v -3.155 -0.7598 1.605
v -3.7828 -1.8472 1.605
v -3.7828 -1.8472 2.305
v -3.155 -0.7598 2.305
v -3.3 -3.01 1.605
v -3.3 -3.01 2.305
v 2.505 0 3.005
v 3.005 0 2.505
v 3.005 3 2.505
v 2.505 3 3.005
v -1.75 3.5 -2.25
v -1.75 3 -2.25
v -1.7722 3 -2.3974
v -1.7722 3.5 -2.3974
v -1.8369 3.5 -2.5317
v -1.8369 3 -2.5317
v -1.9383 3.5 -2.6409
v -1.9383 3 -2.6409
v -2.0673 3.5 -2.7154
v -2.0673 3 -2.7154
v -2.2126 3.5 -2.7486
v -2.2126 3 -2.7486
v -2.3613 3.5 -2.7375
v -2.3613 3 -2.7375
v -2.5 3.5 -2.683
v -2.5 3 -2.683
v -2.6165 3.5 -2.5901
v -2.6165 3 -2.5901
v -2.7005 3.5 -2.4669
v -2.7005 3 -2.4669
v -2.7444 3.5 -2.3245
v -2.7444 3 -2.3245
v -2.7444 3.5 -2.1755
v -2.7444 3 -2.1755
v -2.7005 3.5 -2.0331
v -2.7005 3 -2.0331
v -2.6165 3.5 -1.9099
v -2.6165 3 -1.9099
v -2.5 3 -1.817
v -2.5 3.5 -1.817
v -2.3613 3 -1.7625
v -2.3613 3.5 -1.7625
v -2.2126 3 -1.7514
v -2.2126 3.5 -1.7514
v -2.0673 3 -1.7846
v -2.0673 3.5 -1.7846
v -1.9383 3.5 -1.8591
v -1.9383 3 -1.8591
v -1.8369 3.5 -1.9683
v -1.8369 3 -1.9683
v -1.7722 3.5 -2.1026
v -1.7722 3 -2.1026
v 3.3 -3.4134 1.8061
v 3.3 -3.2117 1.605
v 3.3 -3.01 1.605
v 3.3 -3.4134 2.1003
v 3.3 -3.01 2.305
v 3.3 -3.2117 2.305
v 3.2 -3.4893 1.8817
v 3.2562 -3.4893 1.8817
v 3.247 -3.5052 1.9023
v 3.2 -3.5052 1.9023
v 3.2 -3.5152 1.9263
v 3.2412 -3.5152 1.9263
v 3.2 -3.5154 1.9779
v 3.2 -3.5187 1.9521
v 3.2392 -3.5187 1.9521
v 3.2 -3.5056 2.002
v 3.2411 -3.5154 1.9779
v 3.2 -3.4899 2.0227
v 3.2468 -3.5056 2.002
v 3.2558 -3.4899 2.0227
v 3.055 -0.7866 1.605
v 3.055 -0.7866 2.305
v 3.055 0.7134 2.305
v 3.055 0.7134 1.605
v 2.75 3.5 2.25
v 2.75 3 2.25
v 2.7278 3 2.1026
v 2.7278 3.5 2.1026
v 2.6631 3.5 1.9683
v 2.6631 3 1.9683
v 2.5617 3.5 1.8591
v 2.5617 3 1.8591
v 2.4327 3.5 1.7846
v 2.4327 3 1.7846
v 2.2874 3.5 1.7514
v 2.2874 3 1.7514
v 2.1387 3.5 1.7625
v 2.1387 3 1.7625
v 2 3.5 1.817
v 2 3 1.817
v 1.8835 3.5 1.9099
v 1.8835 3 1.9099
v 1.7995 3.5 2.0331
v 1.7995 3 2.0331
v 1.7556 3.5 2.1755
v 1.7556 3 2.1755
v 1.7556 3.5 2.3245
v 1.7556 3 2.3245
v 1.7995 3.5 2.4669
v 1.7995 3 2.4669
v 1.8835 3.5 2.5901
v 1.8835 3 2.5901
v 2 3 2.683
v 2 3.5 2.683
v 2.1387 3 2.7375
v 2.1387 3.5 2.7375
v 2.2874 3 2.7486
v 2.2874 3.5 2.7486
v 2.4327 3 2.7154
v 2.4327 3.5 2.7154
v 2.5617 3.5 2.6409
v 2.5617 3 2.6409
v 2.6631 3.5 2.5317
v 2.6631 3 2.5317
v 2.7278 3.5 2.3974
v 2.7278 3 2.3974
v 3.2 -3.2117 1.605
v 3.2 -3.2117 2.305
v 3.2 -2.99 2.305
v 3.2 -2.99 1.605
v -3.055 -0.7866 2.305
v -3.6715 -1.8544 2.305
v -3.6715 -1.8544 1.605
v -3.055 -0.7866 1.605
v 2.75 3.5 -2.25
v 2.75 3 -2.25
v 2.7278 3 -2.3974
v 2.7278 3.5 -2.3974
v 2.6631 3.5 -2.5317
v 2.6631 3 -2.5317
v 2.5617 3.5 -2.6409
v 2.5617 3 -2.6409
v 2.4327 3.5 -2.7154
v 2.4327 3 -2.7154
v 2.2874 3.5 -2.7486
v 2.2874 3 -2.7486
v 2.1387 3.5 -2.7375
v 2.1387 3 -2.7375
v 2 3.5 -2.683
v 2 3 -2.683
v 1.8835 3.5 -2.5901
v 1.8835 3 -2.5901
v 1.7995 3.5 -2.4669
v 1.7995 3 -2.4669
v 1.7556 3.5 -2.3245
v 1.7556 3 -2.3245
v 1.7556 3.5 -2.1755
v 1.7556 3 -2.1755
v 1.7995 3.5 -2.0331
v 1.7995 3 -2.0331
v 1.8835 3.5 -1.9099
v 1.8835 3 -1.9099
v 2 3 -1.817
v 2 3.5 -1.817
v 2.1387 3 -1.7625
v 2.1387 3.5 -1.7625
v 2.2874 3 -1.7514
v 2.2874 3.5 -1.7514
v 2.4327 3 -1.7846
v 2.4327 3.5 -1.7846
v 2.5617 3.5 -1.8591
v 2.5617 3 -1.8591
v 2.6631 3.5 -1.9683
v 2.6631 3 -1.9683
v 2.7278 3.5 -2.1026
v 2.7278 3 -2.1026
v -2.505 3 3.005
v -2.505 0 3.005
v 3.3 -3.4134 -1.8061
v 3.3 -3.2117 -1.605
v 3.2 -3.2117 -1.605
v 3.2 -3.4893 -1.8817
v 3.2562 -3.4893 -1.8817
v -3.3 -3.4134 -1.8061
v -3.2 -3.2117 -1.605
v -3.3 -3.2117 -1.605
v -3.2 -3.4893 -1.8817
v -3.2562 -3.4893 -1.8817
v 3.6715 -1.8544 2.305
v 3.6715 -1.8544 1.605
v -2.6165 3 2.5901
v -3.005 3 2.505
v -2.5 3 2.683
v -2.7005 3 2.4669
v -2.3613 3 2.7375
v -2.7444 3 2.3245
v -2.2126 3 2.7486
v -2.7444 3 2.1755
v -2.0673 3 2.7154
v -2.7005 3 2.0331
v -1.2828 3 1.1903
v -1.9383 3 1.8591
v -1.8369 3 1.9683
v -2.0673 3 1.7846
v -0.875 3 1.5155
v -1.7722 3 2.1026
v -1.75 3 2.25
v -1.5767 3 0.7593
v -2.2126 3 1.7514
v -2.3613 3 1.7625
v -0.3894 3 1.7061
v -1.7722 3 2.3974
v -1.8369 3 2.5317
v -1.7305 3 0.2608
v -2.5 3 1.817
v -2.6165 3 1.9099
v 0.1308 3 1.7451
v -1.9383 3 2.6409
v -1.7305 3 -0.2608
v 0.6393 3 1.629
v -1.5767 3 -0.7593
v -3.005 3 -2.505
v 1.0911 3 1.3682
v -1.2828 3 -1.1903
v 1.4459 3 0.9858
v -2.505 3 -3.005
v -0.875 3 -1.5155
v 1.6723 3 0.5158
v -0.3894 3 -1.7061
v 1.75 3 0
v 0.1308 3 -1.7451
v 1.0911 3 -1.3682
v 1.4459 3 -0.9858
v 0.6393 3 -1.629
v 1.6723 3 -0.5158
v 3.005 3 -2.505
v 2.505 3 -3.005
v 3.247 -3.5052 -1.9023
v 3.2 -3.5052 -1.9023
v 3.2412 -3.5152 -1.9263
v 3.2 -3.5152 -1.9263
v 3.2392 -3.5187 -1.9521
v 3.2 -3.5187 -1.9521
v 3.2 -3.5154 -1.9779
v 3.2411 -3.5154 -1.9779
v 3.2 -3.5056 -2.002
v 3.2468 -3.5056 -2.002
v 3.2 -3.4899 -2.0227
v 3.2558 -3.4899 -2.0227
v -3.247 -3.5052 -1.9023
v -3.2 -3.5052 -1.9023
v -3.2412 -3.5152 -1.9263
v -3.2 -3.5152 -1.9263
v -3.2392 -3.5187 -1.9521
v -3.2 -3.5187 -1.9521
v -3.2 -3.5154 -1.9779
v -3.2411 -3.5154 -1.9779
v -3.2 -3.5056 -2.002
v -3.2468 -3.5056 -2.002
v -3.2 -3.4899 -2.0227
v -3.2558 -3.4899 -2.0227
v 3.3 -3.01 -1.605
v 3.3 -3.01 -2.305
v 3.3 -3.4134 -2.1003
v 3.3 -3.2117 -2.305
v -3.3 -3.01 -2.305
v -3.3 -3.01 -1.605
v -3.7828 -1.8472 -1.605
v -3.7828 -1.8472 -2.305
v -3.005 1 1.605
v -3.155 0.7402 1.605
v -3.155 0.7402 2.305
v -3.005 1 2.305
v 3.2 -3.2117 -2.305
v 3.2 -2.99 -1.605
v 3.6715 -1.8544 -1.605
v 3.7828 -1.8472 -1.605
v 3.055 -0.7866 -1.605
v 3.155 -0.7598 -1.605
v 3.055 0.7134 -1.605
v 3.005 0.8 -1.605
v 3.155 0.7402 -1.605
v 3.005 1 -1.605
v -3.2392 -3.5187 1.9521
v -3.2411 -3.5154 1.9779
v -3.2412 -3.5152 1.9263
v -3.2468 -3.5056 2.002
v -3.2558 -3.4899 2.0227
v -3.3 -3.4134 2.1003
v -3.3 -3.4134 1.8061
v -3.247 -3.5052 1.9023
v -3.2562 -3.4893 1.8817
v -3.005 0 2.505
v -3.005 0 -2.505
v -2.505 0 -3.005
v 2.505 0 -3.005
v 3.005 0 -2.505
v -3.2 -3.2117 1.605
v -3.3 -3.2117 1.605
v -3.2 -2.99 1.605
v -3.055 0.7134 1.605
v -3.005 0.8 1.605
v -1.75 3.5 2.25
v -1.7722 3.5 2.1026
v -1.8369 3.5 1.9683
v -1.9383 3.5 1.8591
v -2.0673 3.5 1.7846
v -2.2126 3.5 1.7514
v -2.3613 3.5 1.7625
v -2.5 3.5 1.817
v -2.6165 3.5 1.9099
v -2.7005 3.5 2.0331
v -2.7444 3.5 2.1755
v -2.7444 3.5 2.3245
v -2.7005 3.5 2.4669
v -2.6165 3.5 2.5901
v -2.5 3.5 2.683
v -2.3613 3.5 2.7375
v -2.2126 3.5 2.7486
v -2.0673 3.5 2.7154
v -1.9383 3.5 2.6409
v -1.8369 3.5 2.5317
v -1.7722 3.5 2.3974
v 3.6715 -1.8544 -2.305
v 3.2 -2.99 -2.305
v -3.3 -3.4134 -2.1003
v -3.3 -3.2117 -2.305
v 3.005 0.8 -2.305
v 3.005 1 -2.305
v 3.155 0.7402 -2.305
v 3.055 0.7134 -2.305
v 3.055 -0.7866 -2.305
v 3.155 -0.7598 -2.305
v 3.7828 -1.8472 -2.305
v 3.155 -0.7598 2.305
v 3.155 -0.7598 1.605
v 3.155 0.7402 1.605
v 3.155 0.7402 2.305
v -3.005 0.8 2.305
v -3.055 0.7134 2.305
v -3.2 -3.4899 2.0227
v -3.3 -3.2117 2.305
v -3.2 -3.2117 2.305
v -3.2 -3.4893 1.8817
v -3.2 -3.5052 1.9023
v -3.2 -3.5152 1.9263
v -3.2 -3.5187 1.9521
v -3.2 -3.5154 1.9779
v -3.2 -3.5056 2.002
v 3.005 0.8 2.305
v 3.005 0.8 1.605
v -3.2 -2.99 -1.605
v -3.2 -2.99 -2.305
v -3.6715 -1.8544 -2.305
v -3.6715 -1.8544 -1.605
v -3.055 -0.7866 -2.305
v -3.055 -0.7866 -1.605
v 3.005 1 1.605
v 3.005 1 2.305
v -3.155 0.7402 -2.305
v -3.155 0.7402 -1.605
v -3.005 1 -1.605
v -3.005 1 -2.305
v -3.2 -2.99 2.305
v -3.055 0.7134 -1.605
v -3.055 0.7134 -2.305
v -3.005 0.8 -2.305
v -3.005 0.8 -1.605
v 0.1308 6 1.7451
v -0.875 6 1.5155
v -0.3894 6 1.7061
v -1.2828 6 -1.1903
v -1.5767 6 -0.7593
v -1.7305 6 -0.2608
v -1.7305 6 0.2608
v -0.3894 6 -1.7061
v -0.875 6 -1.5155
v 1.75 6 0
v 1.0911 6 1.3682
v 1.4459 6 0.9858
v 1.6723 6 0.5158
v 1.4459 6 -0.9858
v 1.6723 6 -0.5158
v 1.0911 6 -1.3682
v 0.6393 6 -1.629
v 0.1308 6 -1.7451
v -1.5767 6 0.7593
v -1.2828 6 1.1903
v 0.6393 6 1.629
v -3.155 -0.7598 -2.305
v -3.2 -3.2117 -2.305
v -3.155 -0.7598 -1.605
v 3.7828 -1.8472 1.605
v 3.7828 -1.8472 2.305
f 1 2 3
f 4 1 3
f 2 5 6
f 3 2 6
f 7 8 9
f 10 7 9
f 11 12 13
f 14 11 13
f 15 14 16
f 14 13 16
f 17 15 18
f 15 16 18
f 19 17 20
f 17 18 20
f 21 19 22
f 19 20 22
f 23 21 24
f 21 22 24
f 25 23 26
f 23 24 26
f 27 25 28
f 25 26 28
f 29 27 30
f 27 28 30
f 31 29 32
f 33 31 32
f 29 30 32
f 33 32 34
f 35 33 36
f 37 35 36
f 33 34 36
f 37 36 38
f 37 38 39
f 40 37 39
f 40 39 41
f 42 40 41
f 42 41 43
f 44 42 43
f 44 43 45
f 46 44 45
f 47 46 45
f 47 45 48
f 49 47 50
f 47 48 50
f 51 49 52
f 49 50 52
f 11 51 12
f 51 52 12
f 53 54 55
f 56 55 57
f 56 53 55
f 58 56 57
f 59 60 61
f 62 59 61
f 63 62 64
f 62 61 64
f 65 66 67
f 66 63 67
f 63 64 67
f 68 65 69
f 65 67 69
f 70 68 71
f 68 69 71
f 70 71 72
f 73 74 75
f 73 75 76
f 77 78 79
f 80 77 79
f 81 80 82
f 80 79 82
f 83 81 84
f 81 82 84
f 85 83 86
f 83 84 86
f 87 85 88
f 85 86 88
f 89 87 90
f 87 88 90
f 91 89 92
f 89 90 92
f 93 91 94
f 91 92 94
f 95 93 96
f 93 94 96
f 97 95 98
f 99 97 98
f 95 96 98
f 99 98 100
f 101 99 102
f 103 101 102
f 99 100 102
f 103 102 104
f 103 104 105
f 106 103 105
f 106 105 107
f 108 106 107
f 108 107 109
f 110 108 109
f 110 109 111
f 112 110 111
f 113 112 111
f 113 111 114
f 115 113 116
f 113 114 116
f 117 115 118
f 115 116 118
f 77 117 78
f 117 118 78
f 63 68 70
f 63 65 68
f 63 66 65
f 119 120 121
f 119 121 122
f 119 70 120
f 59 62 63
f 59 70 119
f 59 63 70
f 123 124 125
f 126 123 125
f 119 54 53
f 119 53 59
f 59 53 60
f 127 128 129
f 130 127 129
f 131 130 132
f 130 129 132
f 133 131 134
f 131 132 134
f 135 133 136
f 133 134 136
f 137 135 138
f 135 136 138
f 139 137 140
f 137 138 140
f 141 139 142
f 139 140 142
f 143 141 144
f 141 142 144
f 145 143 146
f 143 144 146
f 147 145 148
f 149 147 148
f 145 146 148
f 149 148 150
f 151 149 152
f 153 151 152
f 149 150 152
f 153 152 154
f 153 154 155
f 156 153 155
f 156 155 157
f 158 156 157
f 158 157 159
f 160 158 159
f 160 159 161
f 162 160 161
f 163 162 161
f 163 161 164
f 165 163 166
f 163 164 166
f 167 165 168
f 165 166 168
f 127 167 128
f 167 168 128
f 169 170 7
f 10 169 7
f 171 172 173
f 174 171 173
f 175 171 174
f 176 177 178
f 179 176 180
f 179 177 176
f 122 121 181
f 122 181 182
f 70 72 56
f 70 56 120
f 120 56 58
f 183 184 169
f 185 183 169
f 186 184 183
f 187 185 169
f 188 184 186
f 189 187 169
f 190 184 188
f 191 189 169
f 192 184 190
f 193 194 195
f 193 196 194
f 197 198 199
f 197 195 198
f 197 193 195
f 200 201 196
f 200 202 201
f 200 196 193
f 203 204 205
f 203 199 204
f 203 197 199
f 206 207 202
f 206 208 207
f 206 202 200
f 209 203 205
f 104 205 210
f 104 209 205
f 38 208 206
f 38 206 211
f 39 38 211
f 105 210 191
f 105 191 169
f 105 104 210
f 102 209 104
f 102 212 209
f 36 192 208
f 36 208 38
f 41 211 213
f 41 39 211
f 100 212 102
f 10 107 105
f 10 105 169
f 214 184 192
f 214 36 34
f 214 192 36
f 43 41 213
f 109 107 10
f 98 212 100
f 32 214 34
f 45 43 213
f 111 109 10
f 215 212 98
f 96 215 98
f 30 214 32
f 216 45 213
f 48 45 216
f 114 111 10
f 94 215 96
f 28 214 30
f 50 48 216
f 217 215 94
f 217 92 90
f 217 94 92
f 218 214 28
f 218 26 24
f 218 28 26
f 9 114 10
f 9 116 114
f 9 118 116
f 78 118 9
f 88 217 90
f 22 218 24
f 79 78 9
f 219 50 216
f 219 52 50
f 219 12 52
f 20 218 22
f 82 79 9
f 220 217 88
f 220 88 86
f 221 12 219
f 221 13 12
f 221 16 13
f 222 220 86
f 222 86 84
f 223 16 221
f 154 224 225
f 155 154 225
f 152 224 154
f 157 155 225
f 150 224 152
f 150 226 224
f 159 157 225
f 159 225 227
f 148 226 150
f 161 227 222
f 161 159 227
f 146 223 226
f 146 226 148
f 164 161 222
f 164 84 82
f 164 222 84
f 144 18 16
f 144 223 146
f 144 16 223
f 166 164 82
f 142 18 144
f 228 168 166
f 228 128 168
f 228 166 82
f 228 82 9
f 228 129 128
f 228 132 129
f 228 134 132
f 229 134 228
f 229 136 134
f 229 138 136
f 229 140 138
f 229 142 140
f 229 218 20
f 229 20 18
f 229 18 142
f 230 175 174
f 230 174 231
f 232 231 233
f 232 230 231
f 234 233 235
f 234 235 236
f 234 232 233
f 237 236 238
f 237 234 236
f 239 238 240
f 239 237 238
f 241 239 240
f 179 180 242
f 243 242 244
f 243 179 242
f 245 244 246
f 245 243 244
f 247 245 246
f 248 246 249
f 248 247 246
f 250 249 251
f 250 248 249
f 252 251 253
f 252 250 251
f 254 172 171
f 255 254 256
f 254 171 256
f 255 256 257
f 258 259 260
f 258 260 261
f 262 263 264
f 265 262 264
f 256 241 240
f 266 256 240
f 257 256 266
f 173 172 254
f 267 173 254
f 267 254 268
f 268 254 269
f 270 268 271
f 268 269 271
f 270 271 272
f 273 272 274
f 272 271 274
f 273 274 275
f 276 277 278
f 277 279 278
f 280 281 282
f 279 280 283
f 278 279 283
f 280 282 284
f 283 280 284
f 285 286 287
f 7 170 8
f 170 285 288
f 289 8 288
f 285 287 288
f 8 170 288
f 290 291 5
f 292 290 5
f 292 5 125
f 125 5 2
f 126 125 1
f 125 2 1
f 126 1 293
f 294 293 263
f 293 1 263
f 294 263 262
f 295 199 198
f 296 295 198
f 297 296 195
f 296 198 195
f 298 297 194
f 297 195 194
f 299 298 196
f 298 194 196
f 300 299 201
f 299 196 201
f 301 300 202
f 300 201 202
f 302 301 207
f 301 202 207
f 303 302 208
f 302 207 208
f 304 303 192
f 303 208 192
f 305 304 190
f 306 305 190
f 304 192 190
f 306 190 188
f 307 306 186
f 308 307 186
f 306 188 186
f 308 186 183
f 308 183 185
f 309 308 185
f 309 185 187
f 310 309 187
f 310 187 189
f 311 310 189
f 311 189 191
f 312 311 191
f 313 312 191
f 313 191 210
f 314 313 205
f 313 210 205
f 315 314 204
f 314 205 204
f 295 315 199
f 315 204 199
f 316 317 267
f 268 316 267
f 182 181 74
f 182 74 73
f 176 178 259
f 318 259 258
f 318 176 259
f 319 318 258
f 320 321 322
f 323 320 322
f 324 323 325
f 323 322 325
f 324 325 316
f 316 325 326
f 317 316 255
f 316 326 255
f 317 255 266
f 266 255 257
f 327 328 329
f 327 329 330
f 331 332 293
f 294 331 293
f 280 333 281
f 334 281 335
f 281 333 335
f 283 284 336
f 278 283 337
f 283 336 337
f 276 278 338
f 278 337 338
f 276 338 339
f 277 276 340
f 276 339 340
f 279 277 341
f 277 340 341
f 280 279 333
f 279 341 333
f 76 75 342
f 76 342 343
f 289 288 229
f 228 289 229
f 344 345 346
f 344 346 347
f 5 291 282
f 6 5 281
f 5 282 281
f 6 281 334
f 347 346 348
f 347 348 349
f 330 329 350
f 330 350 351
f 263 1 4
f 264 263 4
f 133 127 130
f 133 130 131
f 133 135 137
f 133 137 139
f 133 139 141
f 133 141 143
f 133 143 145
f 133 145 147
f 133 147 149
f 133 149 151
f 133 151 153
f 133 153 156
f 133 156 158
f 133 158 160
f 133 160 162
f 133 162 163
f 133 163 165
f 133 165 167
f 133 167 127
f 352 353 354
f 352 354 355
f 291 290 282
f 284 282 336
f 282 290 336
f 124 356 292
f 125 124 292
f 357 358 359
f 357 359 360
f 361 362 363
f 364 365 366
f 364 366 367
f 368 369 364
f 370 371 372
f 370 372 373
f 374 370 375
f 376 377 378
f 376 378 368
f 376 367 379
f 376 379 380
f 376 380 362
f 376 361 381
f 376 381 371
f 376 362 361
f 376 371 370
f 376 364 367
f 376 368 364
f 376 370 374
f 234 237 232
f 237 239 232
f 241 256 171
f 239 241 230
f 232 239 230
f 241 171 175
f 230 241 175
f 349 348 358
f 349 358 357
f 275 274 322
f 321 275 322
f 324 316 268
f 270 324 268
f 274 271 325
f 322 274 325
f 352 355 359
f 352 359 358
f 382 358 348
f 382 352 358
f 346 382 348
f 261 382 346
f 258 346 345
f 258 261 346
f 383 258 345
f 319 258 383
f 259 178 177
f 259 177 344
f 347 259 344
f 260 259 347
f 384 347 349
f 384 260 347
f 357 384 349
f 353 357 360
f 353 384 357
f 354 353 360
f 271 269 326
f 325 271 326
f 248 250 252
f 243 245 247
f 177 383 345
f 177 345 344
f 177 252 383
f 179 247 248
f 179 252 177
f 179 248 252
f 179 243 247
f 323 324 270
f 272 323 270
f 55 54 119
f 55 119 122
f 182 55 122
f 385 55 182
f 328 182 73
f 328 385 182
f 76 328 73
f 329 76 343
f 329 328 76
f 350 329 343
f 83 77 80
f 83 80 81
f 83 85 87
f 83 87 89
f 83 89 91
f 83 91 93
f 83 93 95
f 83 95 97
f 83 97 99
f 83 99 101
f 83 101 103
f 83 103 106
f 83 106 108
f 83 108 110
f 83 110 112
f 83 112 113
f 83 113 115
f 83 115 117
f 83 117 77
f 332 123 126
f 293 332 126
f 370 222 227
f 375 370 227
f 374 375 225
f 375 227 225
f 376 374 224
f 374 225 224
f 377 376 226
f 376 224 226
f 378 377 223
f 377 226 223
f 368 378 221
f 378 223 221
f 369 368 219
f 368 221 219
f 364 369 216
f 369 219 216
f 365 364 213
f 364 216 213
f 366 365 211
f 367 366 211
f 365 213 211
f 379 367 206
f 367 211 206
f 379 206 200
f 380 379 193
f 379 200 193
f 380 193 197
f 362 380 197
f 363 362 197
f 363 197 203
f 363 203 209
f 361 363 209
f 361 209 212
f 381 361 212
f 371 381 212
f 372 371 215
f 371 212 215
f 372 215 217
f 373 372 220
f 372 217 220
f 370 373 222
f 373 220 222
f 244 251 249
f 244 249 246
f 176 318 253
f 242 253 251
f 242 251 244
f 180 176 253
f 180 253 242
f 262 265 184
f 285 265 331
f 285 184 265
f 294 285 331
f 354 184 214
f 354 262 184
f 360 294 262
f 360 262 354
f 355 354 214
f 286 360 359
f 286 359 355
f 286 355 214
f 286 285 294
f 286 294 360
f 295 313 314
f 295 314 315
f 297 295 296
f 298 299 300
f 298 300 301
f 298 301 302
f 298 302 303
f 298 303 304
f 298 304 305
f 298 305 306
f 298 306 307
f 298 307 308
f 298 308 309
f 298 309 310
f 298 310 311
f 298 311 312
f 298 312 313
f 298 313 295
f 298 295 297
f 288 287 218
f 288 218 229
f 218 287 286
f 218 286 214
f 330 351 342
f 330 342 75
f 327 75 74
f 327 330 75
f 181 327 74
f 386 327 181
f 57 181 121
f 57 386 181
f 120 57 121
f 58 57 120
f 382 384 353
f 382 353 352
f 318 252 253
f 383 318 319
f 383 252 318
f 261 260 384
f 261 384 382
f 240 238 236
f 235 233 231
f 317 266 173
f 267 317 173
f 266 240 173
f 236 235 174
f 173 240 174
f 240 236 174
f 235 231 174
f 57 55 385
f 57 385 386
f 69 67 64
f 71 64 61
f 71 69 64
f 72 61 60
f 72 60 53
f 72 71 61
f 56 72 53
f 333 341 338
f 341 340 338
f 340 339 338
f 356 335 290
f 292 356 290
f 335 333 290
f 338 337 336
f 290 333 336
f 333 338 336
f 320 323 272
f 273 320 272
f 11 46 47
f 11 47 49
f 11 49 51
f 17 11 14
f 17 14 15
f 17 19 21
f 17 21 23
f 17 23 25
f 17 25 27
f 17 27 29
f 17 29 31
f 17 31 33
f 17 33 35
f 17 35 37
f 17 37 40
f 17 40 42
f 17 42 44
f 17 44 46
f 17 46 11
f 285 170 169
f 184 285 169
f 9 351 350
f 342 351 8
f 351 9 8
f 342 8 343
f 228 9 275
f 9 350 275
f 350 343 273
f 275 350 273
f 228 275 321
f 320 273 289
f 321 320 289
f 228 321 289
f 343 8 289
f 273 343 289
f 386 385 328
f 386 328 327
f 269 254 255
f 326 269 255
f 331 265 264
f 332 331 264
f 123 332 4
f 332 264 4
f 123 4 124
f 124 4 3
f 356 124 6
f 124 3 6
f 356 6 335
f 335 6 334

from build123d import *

# Parameters (mm, degrees)
SKETCH1_W               = 6.01
SKETCH1_H               = 6.01
BOSS_EXTRUDE1_DEPTH     = 3
CHAMFER1_SIZE           = 0.5
SKETCH3_R               = 1.75
BOSS_EXTRUDE2_DEPTH     = 3
SKETCH4_R               = 0.5
BOSS_EXTRUDE6_DEPTH     = 0.5
SKETCH5_R               = 0.5
BOSS_EXTRUDE7_DEPTH     = 0.5
SKETCH6_W               = 0.7
SKETCH6_H               = 0.2
MIRROR2_COPY_1_SKETCH_W = 0.7
MIRROR2_COPY_1_SKETCH_H = 0.2
CUT_EXTRUDE1_DEPTH      = 4.782799277


with BuildPart() as part:
    # Sketch1 → Boss-Extrude1 (new body)
    with BuildSketch(Plane(origin=(0, 0, 0), x_dir=(1, 0, 0), z_dir=(0, 1, 0))):
        Rectangle(SKETCH1_W, SKETCH1_H)
    extrude(amount=BOSS_EXTRUDE1_DEPTH)

    # Chamfer1
    chamfer1_edges = [part.edges().sort_by_distance(p)[0] for p in [
        (3.005, 1.5, 3.005),
        (-3.005, 1.5, 3.005),
        (-3.005, 1.5, -3.005),
        (3.005, 1.5, -3.005),
    ]]
    chamfer(chamfer1_edges, length=CHAMFER1_SIZE)

    # Sketch3 → Boss-Extrude2 (add)
    with BuildSketch(Plane(origin=(0, 3, 0), x_dir=(1, 0, 0), z_dir=(0, 1, 0))):
        Circle(SKETCH3_R)
    extrude(amount=BOSS_EXTRUDE2_DEPTH)

    # Sketch4 → Boss-Extrude6 (add)
    with BuildSketch(Plane(origin=(0, 3, 0), x_dir=(1, 0, 0), z_dir=(0, 1, 0))):
        with Locations((2.25, 2.25)):
            Circle(SKETCH4_R)
        with Locations((2.25, -2.25)):
            Circle(SKETCH4_R)
        with Locations((-2.25, 2.25)):
            Circle(SKETCH4_R)
    extrude(amount=BOSS_EXTRUDE6_DEPTH)

    # Sketch5 → Boss-Extrude7 (add)
    with BuildSketch(Plane(origin=(0, 3, 0), x_dir=(1, 0, 0), z_dir=(0, 1, 0))):
        with Locations((-2.25, -2.25)):
            Circle(SKETCH5_R)
    extrude(amount=BOSS_EXTRUDE7_DEPTH)

    # Sweep1: sweep along a path in Sketch7
    with BuildLine(Plane.XY) as sweep1_path:
        Line((-3.005, 0.9), (-3.105, 0.726794919))
        Line((-3.105, 0.726794919), (-3.105, -0.773205081))
        Line((-3.105, -0.773205081), (-3.72715614, -1.850811126))
        Line((-3.72715614, -1.850811126), (-3.25, -3))
        Line((-3.25, -3), (-3.25, -3.5))
    # Sketch6 → Sweep1 (sweep)
    with BuildSketch(Plane.ZY.offset(3.005)):
        with Locations((-1.955, 0.9)):
            Rectangle(SKETCH6_W, SKETCH6_H)
    sweep1 = sweep(path=sweep1_path.line, transition=Transition.RIGHT)

    # Mirror1: Sweep1 across plane
    add(sweep1.mirror(Plane.XY))

    # Mirror2: Sweep1 across plane
    add(sweep1.mirror(Plane(origin=(0, 0, 0), x_dir=(0, 0, 1), z_dir=(1, 0, 0))))

    # Mirror2 copy 1: sweep along a path in Mirror2 copy 1 path
    with BuildLine(Plane(origin=(0, 0, 0), x_dir=(-1, 0, 0), z_dir=(0, 0, -1))) as mirror2_copy_1_path:
        Line((-3.005, 0.9), (-3.105, 0.726794919))
        Line((-3.105, 0.726794919), (-3.105, -0.773205081))
        Line((-3.105, -0.773205081), (-3.72715614, -1.850811126))
        Line((-3.72715614, -1.850811126), (-3.25, -3))
        Line((-3.25, -3), (-3.25, -3.5))
    # Mirror2 copy 1 sketch → Mirror2 copy 1 (sweep)
    with BuildSketch(Plane(origin=(3.005, 0, 0), x_dir=(0, 0, -1), z_dir=(1, 0, 0))):
        with Locations((-1.955, 0.9)):
            Rectangle(MIRROR2_COPY_1_SKETCH_W, MIRROR2_COPY_1_SKETCH_H)
    sweep(path=mirror2_copy_1_path.line, transition=Transition.RIGHT)

    # Sketch8 → Cut-Extrude1 (cut, symmetric)
    with BuildSketch(Plane(origin=(0, 0, 0), x_dir=(0, 0, -1), z_dir=(1, 0, 0))):
        with BuildLine():
            Line((-2.305, -3.211682602), (-2.305, -3.58660254))
            Line((-2.305, -3.58660254), (-1.605, -3.58660254))
            Line((-1.605, -3.58660254), (-1.605, -3.211682602))
            Line((-1.605, -3.211682602), (-1.881694927, -3.48928466))
            ThreePointArc((-1.881694927, -3.48928466), (-1.952077784, -3.518688814), (-2.022718654, -3.489910032))
            Line((-2.022718654, -3.489910032), (-2.305, -3.211682602))
        make_face()
    cut_extrude1 = extrude(amount=CUT_EXTRUDE1_DEPTH, both=True, mode=Mode.SUBTRACT)

    # Mirror3: Cut-Extrude1 across plane
    add(cut_extrude1.mirror(Plane.XY), mode=Mode.SUBTRACT)


solid = part.part
